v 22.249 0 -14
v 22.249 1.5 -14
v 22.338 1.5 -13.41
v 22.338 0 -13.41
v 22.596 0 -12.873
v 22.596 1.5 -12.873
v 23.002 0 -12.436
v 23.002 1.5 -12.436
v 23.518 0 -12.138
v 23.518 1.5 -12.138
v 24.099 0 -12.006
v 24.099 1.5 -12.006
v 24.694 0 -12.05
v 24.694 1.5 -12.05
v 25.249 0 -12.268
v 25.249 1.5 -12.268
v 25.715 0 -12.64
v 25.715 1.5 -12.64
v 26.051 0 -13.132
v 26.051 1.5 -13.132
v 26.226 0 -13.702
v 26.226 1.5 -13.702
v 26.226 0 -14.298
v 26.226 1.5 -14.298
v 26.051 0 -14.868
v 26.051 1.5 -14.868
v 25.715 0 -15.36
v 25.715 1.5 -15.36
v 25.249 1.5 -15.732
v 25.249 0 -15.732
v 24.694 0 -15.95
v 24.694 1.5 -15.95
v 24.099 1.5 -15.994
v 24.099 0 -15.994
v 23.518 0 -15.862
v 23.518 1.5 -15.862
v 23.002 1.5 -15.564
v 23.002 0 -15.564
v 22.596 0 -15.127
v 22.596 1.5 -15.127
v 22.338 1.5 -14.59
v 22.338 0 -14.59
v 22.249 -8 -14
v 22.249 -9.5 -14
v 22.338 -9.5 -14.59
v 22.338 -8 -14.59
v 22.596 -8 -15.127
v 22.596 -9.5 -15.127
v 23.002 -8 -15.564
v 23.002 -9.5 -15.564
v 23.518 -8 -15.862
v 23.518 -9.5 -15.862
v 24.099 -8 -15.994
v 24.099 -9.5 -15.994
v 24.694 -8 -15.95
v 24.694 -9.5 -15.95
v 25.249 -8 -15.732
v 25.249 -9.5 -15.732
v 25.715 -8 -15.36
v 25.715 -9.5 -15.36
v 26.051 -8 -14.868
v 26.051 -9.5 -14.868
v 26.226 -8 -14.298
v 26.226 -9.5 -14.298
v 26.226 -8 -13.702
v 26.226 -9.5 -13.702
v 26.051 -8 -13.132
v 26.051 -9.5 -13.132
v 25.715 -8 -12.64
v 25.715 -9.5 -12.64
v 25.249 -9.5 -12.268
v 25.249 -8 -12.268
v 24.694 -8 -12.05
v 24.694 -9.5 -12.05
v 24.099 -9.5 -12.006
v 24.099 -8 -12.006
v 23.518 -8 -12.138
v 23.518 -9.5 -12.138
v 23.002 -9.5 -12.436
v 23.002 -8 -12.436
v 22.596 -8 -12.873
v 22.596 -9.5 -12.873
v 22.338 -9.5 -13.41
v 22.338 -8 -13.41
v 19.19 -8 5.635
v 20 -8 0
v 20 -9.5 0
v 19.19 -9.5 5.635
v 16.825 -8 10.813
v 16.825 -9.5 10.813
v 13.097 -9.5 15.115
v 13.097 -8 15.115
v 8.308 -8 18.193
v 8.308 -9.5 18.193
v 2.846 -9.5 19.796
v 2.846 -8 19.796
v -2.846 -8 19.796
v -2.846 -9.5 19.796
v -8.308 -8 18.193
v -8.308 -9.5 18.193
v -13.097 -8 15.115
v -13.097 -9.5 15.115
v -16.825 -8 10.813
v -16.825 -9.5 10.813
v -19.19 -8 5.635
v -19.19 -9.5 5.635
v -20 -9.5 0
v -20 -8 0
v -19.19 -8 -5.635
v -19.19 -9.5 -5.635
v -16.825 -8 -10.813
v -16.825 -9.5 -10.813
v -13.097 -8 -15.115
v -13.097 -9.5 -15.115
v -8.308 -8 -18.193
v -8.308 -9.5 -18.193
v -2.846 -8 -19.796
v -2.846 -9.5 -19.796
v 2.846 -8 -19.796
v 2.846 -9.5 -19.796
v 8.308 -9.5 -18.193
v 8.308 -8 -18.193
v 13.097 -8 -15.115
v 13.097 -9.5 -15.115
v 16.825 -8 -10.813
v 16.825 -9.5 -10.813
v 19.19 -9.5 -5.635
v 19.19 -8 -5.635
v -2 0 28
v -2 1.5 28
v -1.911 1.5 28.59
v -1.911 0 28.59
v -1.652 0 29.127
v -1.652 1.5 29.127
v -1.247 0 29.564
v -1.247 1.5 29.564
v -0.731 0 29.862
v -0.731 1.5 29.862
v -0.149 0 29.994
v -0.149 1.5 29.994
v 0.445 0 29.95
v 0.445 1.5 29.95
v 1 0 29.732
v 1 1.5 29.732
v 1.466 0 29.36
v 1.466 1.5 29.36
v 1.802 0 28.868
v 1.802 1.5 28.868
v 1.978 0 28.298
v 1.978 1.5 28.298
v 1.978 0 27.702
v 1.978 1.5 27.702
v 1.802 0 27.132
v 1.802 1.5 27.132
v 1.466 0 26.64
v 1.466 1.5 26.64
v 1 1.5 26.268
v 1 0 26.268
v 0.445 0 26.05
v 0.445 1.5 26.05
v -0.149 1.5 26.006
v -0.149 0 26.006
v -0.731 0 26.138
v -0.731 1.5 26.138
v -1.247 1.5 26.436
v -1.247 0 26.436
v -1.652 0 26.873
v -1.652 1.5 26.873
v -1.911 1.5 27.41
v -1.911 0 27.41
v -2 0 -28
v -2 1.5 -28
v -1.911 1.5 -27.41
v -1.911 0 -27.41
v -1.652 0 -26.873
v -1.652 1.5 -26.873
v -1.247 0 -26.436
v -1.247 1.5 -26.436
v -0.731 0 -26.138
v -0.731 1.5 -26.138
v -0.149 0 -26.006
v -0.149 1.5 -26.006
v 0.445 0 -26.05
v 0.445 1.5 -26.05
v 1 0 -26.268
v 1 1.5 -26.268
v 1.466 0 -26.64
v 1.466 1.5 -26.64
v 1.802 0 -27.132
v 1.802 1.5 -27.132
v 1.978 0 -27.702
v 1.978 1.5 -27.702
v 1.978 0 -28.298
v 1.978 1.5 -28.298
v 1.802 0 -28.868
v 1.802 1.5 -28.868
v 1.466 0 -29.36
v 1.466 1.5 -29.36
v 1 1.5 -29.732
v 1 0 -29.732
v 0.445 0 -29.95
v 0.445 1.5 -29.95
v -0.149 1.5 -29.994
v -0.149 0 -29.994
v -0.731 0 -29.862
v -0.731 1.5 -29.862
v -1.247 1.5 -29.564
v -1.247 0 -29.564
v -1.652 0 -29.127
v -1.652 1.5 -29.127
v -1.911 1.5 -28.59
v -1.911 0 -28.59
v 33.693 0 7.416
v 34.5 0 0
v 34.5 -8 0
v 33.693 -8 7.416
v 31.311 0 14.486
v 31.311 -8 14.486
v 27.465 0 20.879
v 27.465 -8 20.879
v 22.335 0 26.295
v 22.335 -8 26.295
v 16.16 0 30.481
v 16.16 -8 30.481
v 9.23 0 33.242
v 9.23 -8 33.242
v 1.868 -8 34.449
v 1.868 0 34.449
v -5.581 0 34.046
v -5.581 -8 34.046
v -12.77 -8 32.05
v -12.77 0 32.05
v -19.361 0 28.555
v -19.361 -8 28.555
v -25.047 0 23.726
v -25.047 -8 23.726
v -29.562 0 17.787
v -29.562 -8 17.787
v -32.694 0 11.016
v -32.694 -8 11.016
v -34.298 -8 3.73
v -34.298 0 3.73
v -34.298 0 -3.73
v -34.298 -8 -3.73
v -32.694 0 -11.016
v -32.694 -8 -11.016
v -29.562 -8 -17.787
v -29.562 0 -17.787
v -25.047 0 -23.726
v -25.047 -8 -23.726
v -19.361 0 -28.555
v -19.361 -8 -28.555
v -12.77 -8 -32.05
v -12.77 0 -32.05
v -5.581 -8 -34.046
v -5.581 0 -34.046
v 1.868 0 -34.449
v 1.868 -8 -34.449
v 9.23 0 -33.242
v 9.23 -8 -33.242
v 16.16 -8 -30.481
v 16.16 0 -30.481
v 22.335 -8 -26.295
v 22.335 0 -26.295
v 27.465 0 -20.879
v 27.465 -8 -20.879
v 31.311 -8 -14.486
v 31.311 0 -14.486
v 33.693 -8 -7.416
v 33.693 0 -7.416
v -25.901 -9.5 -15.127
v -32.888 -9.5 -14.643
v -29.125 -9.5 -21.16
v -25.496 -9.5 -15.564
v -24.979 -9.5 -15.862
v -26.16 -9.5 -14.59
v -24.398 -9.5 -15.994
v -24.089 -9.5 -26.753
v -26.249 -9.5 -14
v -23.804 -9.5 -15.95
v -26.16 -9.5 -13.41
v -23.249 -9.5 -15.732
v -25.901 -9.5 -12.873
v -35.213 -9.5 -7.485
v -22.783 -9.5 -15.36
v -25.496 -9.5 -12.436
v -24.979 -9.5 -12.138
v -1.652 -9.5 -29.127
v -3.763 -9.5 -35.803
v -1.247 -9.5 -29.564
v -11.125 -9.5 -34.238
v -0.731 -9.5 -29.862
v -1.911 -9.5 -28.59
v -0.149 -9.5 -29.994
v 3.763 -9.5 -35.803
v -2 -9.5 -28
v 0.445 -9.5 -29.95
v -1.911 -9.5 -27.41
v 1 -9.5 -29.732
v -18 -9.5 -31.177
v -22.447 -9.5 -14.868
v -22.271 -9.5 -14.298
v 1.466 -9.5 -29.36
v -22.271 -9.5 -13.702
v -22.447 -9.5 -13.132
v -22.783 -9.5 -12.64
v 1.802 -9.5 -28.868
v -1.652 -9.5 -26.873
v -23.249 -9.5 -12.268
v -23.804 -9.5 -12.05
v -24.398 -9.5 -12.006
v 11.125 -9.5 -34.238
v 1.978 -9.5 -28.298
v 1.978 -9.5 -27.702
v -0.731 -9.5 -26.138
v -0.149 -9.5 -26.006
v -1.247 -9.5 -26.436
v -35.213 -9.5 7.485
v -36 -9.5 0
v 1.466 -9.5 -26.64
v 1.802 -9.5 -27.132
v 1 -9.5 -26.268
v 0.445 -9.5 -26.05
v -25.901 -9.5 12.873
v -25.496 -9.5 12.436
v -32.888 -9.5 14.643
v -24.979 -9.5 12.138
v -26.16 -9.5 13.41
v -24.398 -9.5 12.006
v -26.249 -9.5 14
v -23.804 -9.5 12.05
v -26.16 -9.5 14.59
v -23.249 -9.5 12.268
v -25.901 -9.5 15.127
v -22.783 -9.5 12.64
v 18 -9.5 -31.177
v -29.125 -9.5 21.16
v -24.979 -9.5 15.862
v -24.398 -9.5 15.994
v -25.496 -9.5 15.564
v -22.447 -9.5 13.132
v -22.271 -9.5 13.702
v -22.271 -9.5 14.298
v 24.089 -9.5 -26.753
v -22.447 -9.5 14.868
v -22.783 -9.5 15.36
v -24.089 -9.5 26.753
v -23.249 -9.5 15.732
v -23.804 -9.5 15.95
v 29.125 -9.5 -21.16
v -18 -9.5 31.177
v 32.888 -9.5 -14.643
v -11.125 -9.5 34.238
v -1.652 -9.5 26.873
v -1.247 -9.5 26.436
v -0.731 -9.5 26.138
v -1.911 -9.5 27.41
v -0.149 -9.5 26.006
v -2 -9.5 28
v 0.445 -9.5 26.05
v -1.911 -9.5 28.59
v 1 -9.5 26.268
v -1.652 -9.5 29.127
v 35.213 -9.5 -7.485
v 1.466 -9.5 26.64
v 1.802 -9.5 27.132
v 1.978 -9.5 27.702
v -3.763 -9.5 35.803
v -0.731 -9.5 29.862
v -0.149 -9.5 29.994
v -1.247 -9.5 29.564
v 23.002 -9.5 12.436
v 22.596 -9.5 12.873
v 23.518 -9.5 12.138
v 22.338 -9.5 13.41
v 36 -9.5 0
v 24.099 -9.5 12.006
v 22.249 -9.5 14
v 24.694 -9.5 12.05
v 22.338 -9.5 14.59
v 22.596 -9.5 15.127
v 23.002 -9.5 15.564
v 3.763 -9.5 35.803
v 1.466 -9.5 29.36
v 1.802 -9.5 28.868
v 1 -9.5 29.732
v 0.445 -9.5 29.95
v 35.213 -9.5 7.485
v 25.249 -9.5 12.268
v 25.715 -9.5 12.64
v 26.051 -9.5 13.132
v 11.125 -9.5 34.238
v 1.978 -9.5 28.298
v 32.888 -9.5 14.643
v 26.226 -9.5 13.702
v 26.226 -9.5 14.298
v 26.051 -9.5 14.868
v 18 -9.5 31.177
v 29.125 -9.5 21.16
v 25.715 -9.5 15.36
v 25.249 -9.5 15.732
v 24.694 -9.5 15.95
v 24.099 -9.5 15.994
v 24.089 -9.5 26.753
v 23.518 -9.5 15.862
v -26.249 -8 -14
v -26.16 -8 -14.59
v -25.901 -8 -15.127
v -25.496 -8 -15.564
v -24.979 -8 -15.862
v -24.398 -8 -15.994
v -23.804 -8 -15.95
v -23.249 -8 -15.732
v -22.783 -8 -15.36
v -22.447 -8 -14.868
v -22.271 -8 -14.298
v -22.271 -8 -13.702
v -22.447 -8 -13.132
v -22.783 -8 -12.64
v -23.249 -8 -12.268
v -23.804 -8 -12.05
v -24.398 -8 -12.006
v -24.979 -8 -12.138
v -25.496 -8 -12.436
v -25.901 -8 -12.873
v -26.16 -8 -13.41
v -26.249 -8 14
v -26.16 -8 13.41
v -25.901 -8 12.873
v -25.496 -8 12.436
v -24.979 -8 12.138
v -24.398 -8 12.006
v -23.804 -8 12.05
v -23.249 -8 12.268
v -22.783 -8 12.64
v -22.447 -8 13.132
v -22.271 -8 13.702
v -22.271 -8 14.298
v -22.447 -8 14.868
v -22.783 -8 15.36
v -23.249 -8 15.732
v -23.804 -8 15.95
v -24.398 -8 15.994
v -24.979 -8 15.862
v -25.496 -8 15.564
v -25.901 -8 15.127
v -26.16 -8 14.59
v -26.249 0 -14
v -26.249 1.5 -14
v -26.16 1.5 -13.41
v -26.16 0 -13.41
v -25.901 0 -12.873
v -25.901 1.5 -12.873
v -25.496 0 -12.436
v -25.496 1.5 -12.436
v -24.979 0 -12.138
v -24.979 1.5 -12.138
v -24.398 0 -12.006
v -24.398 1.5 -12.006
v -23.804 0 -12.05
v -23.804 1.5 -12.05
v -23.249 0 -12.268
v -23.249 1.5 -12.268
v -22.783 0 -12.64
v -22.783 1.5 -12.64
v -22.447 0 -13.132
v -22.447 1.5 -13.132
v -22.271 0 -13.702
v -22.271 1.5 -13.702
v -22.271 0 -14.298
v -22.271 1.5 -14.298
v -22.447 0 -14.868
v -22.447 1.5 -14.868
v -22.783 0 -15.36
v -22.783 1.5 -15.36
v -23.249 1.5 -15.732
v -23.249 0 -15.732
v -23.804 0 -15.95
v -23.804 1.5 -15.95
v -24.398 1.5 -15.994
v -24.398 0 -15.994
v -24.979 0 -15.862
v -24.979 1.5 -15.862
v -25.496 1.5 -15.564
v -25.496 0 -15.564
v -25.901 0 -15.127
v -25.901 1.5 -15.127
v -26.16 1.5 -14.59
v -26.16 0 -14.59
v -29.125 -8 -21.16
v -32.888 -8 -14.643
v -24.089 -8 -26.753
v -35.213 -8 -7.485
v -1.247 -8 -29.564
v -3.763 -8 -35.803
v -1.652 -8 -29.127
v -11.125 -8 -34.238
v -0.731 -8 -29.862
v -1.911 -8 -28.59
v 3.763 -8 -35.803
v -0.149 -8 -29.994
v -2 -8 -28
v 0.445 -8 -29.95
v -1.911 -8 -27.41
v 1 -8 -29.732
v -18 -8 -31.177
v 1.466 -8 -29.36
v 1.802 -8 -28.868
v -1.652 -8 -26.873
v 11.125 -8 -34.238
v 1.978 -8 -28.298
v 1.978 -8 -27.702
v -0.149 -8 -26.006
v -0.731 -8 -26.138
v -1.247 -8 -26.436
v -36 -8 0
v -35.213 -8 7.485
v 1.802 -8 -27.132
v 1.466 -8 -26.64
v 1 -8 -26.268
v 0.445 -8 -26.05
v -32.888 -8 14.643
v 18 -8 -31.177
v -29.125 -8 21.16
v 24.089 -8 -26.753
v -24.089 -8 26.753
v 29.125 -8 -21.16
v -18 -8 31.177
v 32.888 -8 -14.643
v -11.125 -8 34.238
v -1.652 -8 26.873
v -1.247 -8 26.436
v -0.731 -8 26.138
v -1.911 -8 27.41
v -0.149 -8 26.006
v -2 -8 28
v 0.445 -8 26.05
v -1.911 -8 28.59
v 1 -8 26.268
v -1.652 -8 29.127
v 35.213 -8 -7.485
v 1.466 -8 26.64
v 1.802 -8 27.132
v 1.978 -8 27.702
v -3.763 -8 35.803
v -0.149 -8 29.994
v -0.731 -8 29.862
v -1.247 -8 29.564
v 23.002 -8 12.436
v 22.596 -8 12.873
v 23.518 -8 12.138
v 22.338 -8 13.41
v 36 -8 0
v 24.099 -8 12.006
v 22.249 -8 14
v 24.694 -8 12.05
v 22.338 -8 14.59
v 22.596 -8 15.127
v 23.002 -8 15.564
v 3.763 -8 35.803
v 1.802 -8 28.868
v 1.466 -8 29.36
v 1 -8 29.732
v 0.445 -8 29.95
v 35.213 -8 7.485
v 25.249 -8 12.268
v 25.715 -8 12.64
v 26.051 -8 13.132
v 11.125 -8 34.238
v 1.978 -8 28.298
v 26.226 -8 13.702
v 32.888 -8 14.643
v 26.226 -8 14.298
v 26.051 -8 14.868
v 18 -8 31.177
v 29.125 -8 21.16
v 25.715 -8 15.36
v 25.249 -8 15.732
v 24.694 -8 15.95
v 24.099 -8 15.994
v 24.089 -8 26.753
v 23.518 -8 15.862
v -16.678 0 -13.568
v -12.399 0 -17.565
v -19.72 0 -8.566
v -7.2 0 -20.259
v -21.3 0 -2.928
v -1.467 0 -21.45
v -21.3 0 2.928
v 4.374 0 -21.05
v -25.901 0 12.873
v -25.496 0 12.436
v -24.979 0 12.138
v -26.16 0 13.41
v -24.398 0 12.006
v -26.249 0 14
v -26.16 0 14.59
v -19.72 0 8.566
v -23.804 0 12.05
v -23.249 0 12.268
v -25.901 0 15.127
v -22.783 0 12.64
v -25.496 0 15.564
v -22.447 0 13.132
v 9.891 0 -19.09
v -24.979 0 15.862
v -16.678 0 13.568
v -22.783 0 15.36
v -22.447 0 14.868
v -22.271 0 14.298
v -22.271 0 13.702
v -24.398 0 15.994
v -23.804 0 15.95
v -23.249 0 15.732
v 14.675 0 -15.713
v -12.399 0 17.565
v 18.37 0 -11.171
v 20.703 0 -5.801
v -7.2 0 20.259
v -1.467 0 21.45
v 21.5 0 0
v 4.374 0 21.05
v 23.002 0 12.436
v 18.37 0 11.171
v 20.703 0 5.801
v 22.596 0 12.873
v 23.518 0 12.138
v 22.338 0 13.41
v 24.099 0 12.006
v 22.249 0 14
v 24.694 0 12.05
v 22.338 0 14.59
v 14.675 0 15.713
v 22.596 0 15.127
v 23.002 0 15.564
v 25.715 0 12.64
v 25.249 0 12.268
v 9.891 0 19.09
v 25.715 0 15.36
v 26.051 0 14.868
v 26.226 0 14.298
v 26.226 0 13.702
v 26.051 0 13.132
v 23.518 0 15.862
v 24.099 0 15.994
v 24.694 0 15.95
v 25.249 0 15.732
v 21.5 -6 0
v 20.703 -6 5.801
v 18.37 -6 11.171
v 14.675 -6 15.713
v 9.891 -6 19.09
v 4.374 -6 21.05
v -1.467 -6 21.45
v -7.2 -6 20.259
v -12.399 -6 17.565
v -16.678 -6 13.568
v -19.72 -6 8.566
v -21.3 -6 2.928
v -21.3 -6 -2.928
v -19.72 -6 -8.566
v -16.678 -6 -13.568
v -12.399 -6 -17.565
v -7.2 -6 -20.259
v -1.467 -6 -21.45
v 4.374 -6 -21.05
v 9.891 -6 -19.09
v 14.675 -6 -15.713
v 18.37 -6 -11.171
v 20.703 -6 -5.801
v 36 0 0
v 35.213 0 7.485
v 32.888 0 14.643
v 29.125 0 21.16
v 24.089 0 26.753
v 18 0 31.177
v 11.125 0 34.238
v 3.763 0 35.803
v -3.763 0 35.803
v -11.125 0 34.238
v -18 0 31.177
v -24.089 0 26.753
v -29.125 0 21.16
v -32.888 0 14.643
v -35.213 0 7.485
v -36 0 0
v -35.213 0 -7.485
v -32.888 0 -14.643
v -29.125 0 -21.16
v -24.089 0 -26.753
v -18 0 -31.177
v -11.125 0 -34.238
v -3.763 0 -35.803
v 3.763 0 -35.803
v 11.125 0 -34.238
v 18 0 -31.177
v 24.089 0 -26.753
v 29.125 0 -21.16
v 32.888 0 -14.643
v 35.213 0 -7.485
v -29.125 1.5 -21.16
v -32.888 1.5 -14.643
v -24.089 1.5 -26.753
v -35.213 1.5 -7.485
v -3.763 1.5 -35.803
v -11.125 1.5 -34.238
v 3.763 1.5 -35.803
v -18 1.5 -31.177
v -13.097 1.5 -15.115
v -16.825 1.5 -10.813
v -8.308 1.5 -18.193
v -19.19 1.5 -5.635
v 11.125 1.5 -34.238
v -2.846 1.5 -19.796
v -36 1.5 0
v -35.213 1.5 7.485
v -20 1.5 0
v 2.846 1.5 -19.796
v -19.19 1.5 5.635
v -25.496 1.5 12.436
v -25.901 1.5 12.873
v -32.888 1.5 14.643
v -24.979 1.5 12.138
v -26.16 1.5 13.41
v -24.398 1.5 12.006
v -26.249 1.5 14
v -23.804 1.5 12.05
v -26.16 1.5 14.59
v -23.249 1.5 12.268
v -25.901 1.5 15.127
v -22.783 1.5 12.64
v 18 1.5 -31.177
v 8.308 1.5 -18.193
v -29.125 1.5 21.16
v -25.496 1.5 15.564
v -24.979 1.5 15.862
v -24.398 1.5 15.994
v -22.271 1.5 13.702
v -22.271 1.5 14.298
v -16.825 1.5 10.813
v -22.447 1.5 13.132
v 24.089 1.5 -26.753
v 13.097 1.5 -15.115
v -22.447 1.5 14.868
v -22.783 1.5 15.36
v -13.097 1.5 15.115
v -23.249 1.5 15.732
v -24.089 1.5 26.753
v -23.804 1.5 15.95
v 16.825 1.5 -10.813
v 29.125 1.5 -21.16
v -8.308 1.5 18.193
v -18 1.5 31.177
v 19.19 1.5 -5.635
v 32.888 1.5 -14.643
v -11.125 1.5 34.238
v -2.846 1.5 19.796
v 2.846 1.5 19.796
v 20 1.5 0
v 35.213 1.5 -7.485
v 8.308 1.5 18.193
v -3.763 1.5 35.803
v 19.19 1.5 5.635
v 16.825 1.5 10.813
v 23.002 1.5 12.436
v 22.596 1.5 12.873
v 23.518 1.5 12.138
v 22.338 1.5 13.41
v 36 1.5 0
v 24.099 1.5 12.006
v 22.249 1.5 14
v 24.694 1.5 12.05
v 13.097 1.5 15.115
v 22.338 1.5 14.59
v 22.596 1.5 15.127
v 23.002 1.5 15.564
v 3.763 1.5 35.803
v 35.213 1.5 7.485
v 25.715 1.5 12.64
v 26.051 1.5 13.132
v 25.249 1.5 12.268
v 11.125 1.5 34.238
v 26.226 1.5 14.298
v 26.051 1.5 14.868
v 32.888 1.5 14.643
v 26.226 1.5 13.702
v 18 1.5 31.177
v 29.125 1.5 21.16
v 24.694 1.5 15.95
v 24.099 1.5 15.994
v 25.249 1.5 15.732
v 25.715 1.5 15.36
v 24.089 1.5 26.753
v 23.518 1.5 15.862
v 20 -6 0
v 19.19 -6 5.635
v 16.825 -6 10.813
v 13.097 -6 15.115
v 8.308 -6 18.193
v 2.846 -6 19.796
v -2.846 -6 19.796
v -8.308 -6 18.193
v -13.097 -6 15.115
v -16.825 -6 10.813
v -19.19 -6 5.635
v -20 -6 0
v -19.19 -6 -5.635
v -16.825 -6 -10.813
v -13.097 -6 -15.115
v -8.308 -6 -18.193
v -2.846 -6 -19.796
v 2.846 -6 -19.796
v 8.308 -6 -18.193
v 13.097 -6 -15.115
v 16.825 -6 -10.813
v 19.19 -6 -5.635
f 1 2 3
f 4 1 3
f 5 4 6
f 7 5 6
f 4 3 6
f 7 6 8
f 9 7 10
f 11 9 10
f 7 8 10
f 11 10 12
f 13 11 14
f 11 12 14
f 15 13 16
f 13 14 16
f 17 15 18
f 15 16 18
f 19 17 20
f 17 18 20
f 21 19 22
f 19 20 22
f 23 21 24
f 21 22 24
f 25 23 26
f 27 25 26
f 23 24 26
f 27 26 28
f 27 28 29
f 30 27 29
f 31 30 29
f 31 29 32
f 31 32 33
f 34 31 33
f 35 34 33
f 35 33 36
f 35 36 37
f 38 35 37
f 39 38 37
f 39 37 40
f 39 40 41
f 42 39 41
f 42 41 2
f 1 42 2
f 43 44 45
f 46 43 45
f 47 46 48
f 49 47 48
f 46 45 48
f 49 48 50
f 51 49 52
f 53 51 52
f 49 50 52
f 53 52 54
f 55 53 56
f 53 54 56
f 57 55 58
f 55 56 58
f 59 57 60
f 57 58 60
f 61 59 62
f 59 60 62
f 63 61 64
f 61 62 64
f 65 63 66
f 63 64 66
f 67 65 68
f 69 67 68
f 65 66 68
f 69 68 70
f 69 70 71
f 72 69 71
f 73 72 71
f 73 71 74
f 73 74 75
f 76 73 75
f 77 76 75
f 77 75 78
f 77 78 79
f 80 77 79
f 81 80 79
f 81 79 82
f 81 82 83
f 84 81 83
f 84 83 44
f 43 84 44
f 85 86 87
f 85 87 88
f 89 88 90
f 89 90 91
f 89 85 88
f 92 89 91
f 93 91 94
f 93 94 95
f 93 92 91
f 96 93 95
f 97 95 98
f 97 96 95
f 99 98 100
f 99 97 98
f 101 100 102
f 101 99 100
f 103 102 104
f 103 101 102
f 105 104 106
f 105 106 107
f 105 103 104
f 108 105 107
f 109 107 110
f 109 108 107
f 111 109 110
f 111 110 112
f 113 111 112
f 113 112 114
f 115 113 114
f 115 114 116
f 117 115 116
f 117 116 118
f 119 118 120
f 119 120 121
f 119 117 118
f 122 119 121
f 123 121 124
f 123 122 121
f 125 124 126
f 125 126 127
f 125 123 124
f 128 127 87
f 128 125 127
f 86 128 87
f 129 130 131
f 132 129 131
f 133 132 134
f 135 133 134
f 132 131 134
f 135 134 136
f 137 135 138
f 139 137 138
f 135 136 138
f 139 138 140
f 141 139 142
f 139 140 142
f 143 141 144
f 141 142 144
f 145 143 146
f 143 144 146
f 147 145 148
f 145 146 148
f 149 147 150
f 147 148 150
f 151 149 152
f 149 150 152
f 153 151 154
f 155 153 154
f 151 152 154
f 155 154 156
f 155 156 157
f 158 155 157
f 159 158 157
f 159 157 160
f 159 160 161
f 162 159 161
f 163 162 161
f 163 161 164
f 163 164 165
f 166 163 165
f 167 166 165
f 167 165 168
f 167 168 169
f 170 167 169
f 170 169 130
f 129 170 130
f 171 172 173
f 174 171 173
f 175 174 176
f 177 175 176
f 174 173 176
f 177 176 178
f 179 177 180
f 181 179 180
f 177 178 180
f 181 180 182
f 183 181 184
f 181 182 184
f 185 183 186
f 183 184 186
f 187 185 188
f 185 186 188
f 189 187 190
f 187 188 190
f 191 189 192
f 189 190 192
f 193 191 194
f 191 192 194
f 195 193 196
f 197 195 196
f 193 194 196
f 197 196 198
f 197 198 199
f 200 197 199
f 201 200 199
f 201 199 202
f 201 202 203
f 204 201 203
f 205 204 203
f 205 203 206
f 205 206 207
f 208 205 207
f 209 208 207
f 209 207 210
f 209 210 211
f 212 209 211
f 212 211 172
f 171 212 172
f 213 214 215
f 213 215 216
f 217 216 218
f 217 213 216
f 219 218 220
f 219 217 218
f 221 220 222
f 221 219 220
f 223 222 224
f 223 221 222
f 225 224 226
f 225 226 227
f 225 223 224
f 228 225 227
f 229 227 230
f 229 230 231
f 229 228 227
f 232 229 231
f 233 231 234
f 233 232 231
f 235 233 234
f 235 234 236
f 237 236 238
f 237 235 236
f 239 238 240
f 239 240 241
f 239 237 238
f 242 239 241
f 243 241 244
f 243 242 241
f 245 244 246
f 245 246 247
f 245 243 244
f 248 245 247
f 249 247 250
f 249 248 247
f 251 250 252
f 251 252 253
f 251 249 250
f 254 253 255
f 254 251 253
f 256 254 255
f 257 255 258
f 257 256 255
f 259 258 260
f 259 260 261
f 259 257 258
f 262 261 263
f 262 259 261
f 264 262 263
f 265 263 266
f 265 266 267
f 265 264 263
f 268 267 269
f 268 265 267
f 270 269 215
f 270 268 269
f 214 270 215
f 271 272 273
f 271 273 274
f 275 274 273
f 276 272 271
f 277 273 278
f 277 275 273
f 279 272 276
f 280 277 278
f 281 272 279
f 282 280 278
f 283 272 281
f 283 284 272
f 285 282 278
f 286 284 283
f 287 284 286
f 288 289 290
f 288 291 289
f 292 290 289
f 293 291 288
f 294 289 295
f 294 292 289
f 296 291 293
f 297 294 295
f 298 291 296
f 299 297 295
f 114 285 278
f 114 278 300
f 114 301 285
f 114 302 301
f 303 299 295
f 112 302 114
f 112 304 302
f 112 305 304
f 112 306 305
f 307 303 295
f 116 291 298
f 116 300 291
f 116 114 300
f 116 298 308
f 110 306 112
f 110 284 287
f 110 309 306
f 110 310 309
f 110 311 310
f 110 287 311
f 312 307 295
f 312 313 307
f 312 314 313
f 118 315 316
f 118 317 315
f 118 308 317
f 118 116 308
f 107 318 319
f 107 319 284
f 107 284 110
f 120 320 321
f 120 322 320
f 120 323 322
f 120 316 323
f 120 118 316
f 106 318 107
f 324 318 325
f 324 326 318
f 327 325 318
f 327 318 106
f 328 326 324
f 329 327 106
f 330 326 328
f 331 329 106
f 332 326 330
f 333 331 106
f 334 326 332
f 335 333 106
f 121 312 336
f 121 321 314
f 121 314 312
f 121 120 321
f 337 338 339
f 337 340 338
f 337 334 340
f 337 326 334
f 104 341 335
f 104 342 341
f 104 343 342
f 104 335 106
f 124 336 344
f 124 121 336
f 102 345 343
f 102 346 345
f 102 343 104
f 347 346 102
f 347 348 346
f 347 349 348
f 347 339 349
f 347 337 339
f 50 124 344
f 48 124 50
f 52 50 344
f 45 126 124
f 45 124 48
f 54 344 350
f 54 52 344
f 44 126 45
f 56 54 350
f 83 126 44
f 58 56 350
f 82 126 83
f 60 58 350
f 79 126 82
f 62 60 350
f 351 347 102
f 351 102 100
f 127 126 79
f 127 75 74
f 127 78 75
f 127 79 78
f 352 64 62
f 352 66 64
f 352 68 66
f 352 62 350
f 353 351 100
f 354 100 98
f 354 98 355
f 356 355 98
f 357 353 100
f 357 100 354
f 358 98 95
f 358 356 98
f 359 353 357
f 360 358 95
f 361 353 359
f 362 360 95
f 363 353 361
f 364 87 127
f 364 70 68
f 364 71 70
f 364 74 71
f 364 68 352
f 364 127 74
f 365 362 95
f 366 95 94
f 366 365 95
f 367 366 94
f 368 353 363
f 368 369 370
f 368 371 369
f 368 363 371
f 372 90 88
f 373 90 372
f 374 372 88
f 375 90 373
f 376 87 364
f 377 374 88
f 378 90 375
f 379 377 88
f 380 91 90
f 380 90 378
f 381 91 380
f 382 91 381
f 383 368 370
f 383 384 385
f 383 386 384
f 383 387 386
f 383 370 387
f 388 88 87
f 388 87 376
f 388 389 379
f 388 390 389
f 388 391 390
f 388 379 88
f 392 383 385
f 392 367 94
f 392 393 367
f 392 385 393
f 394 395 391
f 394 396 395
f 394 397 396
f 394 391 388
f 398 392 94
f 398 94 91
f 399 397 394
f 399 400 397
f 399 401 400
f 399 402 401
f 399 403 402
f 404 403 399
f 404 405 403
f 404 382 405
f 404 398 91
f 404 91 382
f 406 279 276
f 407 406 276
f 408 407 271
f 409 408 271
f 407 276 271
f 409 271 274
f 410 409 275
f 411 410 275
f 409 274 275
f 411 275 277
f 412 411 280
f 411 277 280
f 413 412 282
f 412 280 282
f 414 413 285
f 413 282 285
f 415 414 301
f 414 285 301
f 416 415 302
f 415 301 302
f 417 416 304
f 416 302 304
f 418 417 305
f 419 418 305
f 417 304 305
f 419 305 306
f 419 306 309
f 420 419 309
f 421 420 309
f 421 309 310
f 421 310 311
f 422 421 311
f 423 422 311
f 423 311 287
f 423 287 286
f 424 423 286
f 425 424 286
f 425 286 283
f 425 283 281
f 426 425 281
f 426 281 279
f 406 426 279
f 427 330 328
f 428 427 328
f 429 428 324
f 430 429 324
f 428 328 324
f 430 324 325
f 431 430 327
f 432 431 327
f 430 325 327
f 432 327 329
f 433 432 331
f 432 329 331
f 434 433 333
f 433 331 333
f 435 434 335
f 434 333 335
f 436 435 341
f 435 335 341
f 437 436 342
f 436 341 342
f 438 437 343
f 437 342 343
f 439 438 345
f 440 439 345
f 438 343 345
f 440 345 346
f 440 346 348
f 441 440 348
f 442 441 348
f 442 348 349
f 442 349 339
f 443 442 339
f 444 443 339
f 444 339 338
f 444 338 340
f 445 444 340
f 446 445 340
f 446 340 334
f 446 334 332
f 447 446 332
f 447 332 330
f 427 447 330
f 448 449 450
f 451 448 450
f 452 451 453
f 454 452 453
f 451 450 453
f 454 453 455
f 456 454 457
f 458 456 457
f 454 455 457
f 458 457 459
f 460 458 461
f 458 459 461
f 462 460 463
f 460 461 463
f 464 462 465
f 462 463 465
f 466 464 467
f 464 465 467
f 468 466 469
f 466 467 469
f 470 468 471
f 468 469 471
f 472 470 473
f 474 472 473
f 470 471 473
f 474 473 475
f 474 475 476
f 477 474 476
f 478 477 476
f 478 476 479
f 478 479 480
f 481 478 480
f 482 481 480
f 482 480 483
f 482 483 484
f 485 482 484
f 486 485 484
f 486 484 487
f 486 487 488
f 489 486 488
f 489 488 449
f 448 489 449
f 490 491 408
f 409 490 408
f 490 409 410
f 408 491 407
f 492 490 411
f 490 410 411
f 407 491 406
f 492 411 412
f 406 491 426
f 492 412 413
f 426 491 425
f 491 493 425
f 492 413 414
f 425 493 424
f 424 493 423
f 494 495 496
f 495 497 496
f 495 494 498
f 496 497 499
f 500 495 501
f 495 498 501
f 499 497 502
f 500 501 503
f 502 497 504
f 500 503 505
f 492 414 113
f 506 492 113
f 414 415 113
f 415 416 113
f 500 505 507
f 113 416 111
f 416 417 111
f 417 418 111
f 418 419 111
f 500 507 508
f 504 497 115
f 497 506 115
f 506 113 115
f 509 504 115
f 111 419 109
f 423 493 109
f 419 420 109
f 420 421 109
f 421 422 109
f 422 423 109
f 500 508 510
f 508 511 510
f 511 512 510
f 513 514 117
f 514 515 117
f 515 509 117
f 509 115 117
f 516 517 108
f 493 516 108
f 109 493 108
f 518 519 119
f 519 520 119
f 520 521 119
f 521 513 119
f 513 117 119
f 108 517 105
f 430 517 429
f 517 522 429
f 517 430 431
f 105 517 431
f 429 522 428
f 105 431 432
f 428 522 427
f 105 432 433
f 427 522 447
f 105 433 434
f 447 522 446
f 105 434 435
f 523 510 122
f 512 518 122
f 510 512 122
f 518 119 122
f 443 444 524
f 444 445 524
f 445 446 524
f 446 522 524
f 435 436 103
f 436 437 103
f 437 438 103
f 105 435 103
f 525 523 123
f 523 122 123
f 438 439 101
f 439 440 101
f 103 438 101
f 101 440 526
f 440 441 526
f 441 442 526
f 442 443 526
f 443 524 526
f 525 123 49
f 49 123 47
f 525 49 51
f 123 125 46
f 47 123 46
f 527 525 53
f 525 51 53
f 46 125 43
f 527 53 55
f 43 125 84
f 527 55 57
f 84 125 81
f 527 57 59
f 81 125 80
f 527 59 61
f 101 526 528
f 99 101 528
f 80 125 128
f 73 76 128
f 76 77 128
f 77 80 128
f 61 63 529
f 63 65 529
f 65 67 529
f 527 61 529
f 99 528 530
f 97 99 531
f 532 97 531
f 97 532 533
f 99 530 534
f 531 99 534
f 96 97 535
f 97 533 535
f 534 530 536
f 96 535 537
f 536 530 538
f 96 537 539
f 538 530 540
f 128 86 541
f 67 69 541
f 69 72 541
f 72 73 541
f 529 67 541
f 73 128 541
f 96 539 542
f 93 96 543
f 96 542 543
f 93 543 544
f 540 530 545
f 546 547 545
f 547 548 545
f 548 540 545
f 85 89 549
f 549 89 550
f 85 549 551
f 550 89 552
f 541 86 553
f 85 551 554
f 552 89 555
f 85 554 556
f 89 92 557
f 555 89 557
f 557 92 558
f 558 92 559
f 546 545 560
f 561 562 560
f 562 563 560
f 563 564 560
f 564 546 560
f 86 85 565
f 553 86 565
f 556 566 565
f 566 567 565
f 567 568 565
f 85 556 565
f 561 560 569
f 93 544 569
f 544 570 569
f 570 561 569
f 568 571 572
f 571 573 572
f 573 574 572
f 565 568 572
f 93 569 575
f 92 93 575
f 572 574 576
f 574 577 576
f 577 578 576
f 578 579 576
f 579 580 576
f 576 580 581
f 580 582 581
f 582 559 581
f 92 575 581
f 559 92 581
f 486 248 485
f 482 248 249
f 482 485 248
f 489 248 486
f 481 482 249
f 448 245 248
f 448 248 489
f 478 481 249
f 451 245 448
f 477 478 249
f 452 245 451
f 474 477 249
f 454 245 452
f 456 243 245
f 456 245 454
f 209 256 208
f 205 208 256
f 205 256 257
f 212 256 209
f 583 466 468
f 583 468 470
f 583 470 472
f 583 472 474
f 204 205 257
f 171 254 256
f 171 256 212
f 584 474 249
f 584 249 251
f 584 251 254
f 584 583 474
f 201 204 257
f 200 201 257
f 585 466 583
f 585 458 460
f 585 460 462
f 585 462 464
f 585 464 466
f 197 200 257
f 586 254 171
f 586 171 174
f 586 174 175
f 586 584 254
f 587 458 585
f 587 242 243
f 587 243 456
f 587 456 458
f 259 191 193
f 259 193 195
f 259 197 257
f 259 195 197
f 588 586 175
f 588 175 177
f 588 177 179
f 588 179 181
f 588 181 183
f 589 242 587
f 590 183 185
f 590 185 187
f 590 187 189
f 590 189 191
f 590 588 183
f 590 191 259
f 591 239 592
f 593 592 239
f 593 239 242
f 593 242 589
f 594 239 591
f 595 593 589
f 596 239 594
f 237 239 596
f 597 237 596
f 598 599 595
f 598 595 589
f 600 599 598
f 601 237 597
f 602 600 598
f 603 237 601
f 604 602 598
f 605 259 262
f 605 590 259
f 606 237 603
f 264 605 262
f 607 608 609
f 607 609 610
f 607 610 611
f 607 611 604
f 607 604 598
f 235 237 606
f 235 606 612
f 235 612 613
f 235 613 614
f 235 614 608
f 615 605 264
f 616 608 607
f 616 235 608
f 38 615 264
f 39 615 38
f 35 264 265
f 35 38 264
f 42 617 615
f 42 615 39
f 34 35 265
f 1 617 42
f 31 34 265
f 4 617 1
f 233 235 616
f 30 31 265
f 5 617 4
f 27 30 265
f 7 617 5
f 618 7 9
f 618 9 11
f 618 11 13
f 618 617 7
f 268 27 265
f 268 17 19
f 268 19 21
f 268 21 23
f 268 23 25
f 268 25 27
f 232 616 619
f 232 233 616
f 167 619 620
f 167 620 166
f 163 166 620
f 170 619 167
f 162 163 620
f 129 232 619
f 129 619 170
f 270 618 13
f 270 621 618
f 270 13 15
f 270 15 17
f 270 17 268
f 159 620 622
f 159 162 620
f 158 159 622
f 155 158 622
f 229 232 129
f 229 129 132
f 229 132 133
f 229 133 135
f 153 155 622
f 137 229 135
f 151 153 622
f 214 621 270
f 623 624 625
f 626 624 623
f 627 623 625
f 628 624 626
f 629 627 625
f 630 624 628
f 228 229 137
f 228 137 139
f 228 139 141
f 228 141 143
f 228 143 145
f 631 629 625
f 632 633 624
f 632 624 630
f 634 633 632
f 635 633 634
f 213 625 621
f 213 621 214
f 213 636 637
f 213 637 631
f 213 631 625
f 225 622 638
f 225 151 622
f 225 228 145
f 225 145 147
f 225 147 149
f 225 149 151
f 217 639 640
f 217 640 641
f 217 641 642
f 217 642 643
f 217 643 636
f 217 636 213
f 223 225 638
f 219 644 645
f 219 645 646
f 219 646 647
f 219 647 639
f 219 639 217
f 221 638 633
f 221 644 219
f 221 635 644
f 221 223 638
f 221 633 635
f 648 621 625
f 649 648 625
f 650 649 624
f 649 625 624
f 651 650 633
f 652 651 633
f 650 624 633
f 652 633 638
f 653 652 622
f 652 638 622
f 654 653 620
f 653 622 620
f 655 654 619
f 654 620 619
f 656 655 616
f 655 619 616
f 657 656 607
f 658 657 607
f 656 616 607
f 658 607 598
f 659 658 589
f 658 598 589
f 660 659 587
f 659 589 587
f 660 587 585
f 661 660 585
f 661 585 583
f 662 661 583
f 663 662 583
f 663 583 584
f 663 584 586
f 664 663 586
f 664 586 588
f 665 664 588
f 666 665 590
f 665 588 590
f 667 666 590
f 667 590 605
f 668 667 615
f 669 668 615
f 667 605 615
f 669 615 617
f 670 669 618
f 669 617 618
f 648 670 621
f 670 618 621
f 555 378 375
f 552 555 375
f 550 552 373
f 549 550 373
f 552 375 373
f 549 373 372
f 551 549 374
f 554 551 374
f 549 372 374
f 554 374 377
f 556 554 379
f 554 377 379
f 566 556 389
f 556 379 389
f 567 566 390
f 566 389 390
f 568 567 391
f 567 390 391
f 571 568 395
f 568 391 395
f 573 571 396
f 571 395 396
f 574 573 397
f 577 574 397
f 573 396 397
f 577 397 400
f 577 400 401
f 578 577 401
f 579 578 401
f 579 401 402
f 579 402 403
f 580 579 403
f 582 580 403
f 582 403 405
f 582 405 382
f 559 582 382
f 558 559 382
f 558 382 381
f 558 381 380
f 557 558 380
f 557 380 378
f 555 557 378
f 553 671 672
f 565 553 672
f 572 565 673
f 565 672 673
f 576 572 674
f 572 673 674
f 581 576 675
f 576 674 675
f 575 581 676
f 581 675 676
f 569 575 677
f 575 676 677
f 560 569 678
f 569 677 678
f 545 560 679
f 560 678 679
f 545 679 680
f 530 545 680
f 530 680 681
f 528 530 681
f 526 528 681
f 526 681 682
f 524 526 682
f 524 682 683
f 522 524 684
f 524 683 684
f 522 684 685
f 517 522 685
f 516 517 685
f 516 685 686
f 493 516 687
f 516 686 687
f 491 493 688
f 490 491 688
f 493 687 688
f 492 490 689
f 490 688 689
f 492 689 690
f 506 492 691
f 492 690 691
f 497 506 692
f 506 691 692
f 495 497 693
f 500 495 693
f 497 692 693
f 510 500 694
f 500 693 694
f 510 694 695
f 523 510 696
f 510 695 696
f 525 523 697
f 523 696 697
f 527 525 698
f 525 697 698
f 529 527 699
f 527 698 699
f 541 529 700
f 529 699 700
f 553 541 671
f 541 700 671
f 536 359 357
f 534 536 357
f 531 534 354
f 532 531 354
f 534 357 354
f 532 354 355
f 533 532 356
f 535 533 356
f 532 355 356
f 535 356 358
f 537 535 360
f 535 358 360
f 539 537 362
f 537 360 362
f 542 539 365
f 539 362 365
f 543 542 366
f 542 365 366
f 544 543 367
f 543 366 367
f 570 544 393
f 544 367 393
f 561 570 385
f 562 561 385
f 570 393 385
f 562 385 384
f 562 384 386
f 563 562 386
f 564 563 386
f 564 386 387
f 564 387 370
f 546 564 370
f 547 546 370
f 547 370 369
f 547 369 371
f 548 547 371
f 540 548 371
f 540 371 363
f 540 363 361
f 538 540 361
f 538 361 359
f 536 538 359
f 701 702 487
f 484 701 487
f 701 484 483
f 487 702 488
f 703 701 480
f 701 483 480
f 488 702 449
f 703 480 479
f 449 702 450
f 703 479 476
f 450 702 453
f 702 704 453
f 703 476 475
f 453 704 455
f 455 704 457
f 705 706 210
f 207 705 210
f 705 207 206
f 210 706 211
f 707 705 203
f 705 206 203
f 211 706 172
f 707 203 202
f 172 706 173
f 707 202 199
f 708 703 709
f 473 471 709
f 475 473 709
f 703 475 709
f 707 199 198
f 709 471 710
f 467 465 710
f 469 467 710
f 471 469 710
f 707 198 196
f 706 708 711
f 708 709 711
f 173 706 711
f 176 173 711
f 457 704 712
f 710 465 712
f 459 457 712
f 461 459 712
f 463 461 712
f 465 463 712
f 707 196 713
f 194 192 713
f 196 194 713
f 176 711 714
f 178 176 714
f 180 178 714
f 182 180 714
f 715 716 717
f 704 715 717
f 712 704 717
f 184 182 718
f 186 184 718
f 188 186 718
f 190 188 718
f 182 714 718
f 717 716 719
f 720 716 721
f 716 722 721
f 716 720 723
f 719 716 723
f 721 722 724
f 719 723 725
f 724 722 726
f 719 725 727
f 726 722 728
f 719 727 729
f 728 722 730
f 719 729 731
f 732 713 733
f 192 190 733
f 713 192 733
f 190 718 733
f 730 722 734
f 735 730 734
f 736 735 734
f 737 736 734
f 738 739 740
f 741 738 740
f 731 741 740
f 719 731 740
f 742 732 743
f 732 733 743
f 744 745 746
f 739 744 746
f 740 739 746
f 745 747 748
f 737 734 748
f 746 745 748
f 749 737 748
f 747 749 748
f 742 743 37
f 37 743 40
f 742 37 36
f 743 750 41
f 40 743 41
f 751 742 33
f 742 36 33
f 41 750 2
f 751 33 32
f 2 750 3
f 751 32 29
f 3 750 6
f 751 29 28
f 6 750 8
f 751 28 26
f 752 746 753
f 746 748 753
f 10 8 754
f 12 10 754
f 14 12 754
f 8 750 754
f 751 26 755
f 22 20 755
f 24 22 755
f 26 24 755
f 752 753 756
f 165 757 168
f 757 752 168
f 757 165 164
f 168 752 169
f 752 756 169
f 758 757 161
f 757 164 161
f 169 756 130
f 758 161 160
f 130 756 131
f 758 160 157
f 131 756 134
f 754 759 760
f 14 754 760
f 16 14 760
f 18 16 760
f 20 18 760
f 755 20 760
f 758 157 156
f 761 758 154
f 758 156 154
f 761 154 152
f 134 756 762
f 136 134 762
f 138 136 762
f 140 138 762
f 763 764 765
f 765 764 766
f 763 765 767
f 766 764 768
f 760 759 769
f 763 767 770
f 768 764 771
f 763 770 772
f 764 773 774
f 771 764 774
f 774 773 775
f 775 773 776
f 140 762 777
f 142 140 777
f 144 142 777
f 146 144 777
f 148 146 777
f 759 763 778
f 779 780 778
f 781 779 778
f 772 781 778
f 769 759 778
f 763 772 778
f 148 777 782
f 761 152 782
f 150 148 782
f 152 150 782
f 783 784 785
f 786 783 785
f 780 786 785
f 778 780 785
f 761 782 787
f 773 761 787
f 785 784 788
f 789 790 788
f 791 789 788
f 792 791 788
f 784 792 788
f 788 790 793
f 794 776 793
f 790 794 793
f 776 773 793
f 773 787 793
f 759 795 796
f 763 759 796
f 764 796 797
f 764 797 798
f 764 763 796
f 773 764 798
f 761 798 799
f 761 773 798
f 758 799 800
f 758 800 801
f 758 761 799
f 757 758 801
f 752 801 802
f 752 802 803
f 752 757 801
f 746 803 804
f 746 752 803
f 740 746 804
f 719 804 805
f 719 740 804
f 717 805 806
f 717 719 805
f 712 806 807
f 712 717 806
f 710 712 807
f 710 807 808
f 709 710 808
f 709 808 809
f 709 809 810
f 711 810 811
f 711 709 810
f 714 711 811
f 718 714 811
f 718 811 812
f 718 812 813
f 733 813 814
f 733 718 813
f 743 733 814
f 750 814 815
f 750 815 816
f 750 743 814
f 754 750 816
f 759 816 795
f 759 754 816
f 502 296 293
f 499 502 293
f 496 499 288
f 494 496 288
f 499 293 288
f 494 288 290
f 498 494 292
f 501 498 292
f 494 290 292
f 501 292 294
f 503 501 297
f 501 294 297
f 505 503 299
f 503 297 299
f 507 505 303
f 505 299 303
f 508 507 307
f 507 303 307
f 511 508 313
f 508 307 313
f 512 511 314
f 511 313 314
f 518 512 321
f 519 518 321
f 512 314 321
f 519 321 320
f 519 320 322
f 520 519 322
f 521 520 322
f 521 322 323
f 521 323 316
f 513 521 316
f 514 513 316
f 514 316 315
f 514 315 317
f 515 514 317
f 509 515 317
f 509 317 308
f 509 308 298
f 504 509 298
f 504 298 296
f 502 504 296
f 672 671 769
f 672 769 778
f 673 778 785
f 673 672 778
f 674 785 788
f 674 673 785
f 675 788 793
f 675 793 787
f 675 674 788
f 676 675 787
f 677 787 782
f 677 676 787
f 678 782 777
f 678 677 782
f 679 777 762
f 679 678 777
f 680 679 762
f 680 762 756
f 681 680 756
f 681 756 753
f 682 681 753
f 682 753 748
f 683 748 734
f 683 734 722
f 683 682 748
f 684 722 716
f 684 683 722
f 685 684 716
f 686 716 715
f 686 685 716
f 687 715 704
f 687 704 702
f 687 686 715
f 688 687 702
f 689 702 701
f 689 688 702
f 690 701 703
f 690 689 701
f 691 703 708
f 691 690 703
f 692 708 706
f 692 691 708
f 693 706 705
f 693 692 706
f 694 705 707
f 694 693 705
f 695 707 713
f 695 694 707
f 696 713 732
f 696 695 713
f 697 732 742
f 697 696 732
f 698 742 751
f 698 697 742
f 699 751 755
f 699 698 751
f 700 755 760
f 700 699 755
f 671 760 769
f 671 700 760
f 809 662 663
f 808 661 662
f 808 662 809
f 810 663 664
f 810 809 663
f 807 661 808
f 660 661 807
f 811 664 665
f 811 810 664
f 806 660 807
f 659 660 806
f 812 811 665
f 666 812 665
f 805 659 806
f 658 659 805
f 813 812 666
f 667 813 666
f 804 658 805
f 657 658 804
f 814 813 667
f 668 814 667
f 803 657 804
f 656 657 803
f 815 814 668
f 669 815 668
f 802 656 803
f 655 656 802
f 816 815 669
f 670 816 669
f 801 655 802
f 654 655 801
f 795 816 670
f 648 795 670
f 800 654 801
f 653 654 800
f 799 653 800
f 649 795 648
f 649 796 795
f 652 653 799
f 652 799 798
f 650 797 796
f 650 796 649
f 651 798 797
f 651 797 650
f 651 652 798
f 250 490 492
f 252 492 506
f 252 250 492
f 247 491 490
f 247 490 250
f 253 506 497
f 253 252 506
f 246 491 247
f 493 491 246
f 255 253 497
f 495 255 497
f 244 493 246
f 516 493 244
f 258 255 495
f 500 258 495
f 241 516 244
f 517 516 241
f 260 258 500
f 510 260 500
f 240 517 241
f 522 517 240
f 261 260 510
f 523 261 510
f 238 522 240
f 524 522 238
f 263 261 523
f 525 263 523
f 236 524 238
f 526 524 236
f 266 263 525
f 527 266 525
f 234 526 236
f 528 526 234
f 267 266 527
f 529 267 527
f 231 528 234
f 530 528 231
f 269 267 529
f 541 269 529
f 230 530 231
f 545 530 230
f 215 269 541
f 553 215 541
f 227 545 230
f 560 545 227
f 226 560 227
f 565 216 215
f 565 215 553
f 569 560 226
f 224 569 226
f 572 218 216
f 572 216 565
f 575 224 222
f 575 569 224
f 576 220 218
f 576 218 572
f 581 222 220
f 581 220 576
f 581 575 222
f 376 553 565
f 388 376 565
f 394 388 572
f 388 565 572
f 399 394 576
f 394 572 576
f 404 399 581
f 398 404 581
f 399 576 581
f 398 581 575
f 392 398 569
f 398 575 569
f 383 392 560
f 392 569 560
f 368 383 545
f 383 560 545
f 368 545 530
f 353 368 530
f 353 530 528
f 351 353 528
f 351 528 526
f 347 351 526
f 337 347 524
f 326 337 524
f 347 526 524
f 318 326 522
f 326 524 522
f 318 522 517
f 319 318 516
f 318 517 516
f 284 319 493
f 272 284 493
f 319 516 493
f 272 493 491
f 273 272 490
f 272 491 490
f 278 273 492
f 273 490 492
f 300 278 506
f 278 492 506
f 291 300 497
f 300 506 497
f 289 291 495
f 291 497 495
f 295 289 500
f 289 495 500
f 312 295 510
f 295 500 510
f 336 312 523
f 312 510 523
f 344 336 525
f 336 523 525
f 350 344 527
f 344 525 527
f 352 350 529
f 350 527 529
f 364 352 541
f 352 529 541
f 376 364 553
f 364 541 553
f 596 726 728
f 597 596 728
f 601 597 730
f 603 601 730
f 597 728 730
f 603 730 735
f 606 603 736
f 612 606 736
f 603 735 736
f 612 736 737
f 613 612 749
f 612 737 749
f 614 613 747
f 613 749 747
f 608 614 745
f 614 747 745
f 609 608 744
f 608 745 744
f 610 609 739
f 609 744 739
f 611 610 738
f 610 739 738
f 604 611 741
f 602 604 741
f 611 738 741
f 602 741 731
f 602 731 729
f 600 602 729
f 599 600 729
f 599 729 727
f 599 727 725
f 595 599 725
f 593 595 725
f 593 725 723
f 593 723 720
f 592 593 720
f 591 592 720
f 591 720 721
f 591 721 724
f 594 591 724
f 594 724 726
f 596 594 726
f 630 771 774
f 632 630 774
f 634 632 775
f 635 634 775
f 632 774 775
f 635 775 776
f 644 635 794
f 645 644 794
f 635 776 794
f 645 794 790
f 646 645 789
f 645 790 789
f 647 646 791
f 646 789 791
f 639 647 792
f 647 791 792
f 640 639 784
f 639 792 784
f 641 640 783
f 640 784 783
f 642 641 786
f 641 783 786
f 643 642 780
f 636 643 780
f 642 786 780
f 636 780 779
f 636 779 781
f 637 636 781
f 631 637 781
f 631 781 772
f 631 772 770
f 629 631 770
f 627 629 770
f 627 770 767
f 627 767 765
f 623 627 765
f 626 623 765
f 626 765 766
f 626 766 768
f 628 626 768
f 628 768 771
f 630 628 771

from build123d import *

# Parameters (mm, degrees)
F0_R     = 36
F0_R_2   = 34.5
F0_R_3   = 21.5
F0_R_4   = 20
F1_DEPTH = 1.5
F2_DEPTH = 6
F3_DEPTH = 8
F4_D     = 4
F5_R     = 36
F5_R_2   = 34.5
F5_R_3   = 20
F6_DEPTH = 1.5
F7_D     = 4


with BuildPart() as f1:
    # F0 (on Front) → F1 (new body)
    with BuildSketch(Plane.XZ):
        Circle(F0_R)
        Circle(F0_R_2, mode=Mode.SUBTRACT)
        Circle(F0_R_2)
        Circle(F0_R_3, mode=Mode.SUBTRACT)
        Circle(F0_R_3)
        Circle(F0_R_4, mode=Mode.SUBTRACT)
    extrude(amount=-F1_DEPTH)

    # F0 (on Front) → F2 (join)
    with BuildSketch(Plane.XZ):
        Circle(F0_R_3)
        Circle(F0_R_4, mode=Mode.SUBTRACT)
    extrude(amount=F2_DEPTH)

    # F0 (on Front) → F3 (join)
    with BuildSketch(Plane.XZ):
        Circle(F0_R)
        Circle(F0_R_2, mode=Mode.SUBTRACT)
    extrude(amount=F3_DEPTH)

    # F4 (through all)
    with Locations(Plane.XZ):
        with Locations((0, 28), (24.248711306, 14), (24.248711306, -14), (0, -28), (-24.248711306, -14), (-24.248711306, 14)):
            Hole(F4_D / 2)


with BuildPart() as f6:
    # F5 (on face) → F6 (new body)
    with BuildSketch(Plane.XZ.offset(8)):
        Circle(F5_R)
        Circle(F5_R_2, mode=Mode.SUBTRACT)
        Circle(F5_R_2)
        Circle(F5_R_3, mode=Mode.SUBTRACT)
    extrude(amount=F6_DEPTH)

    # F7 (through all)
    with Locations(Plane(origin=(0, -8, 0), x_dir=(1, 0, 0), z_dir=(0, 1, 0))):
        with Locations((24.248711306, -14), (24.248711306, 14), (0, 28), (-24.248711306, 14), (-24.248711306, -14), (0, -28)):
            Hole(F7_D / 2)


solid = Compound([f1.part, f6.part])
